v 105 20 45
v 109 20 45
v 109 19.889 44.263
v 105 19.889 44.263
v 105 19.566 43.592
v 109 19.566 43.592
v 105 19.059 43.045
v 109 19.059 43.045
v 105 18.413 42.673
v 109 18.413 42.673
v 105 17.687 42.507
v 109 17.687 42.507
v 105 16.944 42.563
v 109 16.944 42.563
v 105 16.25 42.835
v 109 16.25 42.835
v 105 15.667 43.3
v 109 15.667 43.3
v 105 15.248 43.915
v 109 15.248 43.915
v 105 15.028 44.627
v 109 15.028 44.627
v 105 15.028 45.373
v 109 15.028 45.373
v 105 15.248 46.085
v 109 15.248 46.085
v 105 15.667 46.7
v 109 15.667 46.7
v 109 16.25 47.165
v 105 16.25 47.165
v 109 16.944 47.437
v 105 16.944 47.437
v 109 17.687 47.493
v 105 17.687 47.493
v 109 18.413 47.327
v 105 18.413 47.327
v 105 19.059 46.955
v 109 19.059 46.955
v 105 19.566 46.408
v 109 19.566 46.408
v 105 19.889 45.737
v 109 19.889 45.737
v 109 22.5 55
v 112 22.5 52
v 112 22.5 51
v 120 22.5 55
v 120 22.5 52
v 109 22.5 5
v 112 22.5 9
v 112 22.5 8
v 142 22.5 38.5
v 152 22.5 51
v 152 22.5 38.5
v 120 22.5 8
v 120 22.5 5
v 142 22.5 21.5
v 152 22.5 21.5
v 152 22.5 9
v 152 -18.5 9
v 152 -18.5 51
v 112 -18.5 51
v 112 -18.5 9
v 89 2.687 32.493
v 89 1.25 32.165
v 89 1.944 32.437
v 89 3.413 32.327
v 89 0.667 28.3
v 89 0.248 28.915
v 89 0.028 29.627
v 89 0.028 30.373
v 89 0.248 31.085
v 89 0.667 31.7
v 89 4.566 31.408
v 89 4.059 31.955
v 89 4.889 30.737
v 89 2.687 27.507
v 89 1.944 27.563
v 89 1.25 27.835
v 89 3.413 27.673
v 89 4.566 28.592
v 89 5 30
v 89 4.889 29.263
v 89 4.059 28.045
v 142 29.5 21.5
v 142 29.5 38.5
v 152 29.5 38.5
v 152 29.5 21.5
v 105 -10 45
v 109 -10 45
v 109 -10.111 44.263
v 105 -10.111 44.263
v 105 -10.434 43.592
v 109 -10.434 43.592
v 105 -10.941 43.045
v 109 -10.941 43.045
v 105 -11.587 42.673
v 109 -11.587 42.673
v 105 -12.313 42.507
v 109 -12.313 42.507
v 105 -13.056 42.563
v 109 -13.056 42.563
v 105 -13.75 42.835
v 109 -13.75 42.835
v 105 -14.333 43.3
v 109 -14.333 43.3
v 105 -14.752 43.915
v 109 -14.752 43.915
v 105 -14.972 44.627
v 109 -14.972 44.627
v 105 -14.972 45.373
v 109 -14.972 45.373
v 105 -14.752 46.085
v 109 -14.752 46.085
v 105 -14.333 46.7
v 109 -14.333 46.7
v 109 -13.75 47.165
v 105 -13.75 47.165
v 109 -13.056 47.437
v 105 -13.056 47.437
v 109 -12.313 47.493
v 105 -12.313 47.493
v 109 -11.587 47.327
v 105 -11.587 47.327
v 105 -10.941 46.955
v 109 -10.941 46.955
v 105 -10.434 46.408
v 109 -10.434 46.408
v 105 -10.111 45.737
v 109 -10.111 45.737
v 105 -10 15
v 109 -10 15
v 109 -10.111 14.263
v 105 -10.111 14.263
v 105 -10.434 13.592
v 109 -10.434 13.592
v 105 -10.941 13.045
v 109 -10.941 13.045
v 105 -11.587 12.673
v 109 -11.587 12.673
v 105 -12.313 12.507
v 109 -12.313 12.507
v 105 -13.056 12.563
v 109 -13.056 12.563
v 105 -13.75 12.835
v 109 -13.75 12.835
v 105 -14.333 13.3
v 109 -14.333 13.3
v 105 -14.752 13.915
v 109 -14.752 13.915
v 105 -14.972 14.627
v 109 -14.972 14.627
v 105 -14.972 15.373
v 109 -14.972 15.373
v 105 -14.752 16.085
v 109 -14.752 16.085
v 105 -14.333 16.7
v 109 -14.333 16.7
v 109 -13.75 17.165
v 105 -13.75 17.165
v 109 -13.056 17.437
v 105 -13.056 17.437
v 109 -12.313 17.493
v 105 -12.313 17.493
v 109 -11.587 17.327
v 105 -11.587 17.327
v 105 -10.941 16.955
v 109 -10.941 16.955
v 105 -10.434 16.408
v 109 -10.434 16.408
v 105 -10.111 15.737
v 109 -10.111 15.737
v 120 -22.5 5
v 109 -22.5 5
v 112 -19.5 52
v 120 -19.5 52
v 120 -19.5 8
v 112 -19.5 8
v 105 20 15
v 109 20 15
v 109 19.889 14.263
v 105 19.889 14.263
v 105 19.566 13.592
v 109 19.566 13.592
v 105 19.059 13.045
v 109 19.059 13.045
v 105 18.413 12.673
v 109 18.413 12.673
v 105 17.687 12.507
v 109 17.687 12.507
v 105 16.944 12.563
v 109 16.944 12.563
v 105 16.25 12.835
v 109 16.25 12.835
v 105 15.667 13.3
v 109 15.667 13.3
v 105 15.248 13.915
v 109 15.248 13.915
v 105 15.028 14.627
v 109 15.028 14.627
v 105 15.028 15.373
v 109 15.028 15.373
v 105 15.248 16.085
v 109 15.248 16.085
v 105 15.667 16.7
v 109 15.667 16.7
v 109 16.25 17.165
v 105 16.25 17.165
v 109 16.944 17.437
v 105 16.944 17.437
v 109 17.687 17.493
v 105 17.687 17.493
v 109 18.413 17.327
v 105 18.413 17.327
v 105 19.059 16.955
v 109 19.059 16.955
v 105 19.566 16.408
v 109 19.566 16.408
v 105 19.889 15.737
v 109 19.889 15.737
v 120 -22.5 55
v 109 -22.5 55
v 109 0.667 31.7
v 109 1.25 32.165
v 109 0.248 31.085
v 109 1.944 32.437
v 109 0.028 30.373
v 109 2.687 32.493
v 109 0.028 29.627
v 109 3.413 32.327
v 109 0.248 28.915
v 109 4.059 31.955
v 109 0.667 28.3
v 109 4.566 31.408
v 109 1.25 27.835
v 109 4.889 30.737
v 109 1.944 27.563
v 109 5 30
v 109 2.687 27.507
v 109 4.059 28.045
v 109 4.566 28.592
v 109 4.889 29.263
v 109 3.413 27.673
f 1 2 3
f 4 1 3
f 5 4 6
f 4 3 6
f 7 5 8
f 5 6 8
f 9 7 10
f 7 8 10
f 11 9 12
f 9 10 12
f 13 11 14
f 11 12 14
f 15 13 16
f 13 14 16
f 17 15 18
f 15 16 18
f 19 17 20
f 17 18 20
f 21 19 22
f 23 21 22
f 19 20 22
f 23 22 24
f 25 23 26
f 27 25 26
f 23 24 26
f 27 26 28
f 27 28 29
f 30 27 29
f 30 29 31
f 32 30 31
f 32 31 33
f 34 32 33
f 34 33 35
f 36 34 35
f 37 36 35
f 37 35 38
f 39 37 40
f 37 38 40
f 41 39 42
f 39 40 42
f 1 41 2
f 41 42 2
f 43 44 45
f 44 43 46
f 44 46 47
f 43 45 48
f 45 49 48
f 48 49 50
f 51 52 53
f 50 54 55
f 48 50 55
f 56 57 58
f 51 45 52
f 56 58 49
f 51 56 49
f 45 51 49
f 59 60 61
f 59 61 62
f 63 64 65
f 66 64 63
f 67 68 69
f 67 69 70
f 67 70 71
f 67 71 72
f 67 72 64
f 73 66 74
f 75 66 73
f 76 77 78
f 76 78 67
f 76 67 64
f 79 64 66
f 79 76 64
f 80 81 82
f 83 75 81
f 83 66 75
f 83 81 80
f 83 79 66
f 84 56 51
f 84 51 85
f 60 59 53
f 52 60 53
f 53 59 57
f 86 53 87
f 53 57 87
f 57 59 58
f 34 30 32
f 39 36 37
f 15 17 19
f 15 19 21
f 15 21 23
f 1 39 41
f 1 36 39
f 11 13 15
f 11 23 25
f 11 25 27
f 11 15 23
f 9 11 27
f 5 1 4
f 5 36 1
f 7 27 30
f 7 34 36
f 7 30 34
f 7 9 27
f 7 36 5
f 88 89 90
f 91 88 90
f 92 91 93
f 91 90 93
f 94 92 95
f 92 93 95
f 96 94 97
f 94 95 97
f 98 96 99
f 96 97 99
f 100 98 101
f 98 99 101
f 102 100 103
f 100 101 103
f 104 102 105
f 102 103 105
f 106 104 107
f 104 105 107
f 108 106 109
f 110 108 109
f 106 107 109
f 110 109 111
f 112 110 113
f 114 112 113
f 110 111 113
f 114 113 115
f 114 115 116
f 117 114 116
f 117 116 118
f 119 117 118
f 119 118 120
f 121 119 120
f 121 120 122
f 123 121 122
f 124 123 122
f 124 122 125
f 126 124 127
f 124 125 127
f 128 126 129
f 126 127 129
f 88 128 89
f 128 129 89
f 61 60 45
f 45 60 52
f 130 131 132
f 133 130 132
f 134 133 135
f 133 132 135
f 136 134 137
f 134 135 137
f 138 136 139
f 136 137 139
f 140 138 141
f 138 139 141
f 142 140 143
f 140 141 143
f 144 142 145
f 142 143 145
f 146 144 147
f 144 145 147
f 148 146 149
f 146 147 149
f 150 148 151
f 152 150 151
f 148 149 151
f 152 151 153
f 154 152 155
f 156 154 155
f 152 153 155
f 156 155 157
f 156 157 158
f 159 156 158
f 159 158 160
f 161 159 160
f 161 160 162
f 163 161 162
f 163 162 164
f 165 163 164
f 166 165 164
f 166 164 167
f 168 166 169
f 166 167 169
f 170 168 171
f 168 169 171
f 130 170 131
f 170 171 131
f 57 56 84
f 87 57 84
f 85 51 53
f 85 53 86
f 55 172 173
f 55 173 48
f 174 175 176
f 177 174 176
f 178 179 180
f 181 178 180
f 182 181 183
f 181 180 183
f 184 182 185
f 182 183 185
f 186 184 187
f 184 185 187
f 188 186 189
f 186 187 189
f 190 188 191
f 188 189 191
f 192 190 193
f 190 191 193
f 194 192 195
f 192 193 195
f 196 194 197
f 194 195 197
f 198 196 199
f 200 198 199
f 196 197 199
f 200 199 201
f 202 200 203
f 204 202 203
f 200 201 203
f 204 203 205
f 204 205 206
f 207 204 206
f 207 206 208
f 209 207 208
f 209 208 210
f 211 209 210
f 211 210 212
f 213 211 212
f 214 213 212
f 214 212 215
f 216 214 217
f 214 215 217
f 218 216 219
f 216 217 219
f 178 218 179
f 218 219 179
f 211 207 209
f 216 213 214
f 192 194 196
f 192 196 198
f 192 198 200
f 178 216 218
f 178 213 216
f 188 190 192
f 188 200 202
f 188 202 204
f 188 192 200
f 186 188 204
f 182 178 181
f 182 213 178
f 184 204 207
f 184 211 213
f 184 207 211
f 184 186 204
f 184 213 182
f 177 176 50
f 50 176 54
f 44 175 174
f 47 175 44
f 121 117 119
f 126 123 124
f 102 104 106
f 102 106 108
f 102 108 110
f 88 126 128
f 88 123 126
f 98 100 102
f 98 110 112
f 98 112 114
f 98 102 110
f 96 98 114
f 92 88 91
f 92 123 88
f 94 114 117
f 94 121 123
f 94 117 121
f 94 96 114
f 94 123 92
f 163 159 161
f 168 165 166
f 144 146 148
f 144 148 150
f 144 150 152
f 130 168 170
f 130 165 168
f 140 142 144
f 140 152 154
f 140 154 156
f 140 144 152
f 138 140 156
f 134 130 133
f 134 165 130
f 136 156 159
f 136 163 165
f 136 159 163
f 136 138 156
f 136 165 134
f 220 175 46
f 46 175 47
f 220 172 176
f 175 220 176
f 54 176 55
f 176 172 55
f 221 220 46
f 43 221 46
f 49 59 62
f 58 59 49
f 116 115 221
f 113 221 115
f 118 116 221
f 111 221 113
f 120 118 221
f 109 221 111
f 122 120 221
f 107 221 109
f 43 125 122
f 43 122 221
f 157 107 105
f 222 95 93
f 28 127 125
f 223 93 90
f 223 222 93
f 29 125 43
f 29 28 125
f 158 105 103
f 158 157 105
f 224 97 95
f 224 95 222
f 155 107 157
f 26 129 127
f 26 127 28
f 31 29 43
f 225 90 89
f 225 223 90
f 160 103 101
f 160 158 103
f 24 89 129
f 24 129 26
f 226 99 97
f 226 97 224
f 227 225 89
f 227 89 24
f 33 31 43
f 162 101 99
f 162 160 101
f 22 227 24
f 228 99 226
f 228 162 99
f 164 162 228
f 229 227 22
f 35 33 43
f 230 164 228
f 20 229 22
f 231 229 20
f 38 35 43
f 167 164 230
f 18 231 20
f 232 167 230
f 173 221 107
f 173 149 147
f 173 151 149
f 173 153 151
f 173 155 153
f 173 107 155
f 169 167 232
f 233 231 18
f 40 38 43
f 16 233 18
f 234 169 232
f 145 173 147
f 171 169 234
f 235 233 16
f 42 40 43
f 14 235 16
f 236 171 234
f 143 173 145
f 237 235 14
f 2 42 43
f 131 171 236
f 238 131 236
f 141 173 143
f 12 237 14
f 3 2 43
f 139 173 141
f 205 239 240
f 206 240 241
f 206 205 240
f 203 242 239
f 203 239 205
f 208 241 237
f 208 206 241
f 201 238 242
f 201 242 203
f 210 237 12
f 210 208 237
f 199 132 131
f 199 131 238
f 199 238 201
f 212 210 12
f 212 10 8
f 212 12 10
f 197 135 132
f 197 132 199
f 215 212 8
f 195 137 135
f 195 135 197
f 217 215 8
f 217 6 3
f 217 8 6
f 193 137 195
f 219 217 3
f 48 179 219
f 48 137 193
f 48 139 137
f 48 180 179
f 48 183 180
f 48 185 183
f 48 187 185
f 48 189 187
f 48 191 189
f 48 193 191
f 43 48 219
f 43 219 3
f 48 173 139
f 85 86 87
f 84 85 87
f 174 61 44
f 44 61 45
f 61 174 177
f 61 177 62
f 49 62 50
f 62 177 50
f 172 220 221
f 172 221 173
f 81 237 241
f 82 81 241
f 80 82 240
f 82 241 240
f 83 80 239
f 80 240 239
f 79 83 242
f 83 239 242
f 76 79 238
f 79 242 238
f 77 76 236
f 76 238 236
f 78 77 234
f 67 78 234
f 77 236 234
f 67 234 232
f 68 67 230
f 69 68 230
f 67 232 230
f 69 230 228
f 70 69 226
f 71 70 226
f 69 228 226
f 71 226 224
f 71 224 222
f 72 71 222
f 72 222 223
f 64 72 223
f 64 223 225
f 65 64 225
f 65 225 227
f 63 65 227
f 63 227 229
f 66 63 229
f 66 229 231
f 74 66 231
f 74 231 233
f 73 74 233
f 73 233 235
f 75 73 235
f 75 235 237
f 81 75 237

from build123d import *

# Parameters (mm, degrees)
BOX009_W                  = 41
BOX009_H                  = 42
BOX009_DEPTH              = 40
BOX008_W                  = 7
BOX008_H                  = 17
BOX008_DEPTH              = 10
CYLINDER004_R             = 2.5
CYLINDER004_DEPTH         = 25
CYLINDER005_R             = 2.5
CYLINDER005_DEPTH         = 4
BOX012_W                  = 45
BOX012_H                  = 3
BOX012_DEPTH              = 8
BOX011_W                  = 3
BOX011_H                  = 50
BOX011_DEPTH              = 8
BOX010_W                  = 45
BOX010_H                  = 50
BOX010_DEPTH              = 3
FUSION005_ROLL_ANGLE      = -90
FUSION005_PLACEMENT_ANGLE = 90


with BuildPart() as base_motor001:
    # Box009 → Box009 (new body)
    with BuildSketch(Plane(origin=(4, 4, 0), x_dir=(1, 0, 0), z_dir=(0, 0, 1))):
        with Locations((20.5, 21)):
            Rectangle(BOX009_W, BOX009_H)
    extrude(amount=BOX009_DEPTH)


with BuildPart() as alimentacion002:
    # Box008 → Box008 (new body)
    with BuildSketch(Plane(origin=(45, 16.5, 0), x_dir=(1, 0, 0), z_dir=(0, 0, 1))):
        with Locations((3.5, 8.5)):
            Rectangle(BOX008_W, BOX008_H)
    extrude(amount=BOX008_DEPTH)


with BuildPart() as motor001:
    # Cylinder004 → Cylinder004 (new body)
    with BuildSketch(Plane(origin=(25, 25, 38), x_dir=(1, 0, 0), z_dir=(0, 0, 1))):
        Circle(CYLINDER004_R)
    extrude(amount=CYLINDER004_DEPTH)

    # Fusion007: union base motor001, alimentacion002
    add(base_motor001.part)
    add(alimentacion002.part)


with BuildPart() as tonillo_motor009:
    # Cylinder005 → Cylinder005 (new body)
    with BuildSketch(Plane(origin=(10, 10, 43), x_dir=(1, 0, 0), z_dir=(0, 0, 1))):
        Circle(CYLINDER005_R)
    extrude(amount=CYLINDER005_DEPTH)


with BuildPart() as tonillo_motor010:
    # Link009 base: copy of tonillo motor009
    add(tonillo_motor009.part)


with BuildPart() as tonillo_motor010_1:
    # Link009 placement: moved
    add(tonillo_motor010.part.moved(Location((30, 30, 0))))


with BuildPart() as tonillo_motor011:
    # Link010 base: copy of tonillo motor009
    add(tonillo_motor009.part)


with BuildPart() as tonillo_motor011_1:
    # Link010 placement: moved
    add(tonillo_motor011.part.moved(Location((30, 0, 0))))


with BuildPart() as tonillo_motor008:
    # Link007 base: copy of tonillo motor009
    add(tonillo_motor009.part)


with BuildPart() as tonillo_motor008_1:
    # Link007 placement: moved
    add(tonillo_motor008.part.moved(Location((0, 30, 0))))


with BuildPart() as lateral_izq001:
    # Box012 → Box012 (new body)
    with BuildSketch(Plane.XY.offset(32)):
        with Locations((22.5, 1.5)):
            Rectangle(BOX012_W, BOX012_H)
    extrude(amount=BOX012_DEPTH)


with BuildPart() as lateral_der001:
    # Link008 base: copy of lateral izq001
    add(lateral_izq001.part)


with BuildPart() as lateral_der001_1:
    # Link008 placement: moved
    add(lateral_der001.part.moved(Location((0, 47, 0))))


with BuildPart() as lateral_frente001:
    # Box011 → Box011 (new body)
    with BuildSketch(Plane.XY.offset(32)):
        with Locations((1.5, 25)):
            Rectangle(BOX011_W, BOX011_H)
    extrude(amount=BOX011_DEPTH)


with BuildPart() as motor_completo001:
    # Box010 → Box010 (new body)
    with BuildSketch(Plane.XY.offset(40)):
        with Locations((22.5, 25)):
            Rectangle(BOX010_W, BOX010_H)
    extrude(amount=BOX010_DEPTH)

    # Fusion006: union lateral izq001, lateral der001, lateral frente001
    add(lateral_izq001.part)
    add(lateral_der001_1.part)
    add(lateral_frente001.part)

    # Fusion005: union motor001, tonillo motor010, tonillo motor011, tonillo motor008, tonillo motor009
    add(motor001.part)
    add(tonillo_motor010_1.part)
    add(tonillo_motor011_1.part)
    add(tonillo_motor008_1.part)
    add(tonillo_motor009.part)


with BuildPart() as motor_completo001_1:
    # Fusion005 roll: moved
    add(motor_completo001.part.rotate(Axis((0, 0, 0), (1, 0, 0)), FUSION005_ROLL_ANGLE))


with BuildPart() as motor_completo001_2:
    # Fusion005 placement: moved
    add(motor_completo001_1.part.moved(Location((152, -22.5, 55))).rotate(Axis((152, -22.5, 55), (0, 0, 1)), FUSION005_PLACEMENT_ANGLE))


solid = motor_completo001_2.part
